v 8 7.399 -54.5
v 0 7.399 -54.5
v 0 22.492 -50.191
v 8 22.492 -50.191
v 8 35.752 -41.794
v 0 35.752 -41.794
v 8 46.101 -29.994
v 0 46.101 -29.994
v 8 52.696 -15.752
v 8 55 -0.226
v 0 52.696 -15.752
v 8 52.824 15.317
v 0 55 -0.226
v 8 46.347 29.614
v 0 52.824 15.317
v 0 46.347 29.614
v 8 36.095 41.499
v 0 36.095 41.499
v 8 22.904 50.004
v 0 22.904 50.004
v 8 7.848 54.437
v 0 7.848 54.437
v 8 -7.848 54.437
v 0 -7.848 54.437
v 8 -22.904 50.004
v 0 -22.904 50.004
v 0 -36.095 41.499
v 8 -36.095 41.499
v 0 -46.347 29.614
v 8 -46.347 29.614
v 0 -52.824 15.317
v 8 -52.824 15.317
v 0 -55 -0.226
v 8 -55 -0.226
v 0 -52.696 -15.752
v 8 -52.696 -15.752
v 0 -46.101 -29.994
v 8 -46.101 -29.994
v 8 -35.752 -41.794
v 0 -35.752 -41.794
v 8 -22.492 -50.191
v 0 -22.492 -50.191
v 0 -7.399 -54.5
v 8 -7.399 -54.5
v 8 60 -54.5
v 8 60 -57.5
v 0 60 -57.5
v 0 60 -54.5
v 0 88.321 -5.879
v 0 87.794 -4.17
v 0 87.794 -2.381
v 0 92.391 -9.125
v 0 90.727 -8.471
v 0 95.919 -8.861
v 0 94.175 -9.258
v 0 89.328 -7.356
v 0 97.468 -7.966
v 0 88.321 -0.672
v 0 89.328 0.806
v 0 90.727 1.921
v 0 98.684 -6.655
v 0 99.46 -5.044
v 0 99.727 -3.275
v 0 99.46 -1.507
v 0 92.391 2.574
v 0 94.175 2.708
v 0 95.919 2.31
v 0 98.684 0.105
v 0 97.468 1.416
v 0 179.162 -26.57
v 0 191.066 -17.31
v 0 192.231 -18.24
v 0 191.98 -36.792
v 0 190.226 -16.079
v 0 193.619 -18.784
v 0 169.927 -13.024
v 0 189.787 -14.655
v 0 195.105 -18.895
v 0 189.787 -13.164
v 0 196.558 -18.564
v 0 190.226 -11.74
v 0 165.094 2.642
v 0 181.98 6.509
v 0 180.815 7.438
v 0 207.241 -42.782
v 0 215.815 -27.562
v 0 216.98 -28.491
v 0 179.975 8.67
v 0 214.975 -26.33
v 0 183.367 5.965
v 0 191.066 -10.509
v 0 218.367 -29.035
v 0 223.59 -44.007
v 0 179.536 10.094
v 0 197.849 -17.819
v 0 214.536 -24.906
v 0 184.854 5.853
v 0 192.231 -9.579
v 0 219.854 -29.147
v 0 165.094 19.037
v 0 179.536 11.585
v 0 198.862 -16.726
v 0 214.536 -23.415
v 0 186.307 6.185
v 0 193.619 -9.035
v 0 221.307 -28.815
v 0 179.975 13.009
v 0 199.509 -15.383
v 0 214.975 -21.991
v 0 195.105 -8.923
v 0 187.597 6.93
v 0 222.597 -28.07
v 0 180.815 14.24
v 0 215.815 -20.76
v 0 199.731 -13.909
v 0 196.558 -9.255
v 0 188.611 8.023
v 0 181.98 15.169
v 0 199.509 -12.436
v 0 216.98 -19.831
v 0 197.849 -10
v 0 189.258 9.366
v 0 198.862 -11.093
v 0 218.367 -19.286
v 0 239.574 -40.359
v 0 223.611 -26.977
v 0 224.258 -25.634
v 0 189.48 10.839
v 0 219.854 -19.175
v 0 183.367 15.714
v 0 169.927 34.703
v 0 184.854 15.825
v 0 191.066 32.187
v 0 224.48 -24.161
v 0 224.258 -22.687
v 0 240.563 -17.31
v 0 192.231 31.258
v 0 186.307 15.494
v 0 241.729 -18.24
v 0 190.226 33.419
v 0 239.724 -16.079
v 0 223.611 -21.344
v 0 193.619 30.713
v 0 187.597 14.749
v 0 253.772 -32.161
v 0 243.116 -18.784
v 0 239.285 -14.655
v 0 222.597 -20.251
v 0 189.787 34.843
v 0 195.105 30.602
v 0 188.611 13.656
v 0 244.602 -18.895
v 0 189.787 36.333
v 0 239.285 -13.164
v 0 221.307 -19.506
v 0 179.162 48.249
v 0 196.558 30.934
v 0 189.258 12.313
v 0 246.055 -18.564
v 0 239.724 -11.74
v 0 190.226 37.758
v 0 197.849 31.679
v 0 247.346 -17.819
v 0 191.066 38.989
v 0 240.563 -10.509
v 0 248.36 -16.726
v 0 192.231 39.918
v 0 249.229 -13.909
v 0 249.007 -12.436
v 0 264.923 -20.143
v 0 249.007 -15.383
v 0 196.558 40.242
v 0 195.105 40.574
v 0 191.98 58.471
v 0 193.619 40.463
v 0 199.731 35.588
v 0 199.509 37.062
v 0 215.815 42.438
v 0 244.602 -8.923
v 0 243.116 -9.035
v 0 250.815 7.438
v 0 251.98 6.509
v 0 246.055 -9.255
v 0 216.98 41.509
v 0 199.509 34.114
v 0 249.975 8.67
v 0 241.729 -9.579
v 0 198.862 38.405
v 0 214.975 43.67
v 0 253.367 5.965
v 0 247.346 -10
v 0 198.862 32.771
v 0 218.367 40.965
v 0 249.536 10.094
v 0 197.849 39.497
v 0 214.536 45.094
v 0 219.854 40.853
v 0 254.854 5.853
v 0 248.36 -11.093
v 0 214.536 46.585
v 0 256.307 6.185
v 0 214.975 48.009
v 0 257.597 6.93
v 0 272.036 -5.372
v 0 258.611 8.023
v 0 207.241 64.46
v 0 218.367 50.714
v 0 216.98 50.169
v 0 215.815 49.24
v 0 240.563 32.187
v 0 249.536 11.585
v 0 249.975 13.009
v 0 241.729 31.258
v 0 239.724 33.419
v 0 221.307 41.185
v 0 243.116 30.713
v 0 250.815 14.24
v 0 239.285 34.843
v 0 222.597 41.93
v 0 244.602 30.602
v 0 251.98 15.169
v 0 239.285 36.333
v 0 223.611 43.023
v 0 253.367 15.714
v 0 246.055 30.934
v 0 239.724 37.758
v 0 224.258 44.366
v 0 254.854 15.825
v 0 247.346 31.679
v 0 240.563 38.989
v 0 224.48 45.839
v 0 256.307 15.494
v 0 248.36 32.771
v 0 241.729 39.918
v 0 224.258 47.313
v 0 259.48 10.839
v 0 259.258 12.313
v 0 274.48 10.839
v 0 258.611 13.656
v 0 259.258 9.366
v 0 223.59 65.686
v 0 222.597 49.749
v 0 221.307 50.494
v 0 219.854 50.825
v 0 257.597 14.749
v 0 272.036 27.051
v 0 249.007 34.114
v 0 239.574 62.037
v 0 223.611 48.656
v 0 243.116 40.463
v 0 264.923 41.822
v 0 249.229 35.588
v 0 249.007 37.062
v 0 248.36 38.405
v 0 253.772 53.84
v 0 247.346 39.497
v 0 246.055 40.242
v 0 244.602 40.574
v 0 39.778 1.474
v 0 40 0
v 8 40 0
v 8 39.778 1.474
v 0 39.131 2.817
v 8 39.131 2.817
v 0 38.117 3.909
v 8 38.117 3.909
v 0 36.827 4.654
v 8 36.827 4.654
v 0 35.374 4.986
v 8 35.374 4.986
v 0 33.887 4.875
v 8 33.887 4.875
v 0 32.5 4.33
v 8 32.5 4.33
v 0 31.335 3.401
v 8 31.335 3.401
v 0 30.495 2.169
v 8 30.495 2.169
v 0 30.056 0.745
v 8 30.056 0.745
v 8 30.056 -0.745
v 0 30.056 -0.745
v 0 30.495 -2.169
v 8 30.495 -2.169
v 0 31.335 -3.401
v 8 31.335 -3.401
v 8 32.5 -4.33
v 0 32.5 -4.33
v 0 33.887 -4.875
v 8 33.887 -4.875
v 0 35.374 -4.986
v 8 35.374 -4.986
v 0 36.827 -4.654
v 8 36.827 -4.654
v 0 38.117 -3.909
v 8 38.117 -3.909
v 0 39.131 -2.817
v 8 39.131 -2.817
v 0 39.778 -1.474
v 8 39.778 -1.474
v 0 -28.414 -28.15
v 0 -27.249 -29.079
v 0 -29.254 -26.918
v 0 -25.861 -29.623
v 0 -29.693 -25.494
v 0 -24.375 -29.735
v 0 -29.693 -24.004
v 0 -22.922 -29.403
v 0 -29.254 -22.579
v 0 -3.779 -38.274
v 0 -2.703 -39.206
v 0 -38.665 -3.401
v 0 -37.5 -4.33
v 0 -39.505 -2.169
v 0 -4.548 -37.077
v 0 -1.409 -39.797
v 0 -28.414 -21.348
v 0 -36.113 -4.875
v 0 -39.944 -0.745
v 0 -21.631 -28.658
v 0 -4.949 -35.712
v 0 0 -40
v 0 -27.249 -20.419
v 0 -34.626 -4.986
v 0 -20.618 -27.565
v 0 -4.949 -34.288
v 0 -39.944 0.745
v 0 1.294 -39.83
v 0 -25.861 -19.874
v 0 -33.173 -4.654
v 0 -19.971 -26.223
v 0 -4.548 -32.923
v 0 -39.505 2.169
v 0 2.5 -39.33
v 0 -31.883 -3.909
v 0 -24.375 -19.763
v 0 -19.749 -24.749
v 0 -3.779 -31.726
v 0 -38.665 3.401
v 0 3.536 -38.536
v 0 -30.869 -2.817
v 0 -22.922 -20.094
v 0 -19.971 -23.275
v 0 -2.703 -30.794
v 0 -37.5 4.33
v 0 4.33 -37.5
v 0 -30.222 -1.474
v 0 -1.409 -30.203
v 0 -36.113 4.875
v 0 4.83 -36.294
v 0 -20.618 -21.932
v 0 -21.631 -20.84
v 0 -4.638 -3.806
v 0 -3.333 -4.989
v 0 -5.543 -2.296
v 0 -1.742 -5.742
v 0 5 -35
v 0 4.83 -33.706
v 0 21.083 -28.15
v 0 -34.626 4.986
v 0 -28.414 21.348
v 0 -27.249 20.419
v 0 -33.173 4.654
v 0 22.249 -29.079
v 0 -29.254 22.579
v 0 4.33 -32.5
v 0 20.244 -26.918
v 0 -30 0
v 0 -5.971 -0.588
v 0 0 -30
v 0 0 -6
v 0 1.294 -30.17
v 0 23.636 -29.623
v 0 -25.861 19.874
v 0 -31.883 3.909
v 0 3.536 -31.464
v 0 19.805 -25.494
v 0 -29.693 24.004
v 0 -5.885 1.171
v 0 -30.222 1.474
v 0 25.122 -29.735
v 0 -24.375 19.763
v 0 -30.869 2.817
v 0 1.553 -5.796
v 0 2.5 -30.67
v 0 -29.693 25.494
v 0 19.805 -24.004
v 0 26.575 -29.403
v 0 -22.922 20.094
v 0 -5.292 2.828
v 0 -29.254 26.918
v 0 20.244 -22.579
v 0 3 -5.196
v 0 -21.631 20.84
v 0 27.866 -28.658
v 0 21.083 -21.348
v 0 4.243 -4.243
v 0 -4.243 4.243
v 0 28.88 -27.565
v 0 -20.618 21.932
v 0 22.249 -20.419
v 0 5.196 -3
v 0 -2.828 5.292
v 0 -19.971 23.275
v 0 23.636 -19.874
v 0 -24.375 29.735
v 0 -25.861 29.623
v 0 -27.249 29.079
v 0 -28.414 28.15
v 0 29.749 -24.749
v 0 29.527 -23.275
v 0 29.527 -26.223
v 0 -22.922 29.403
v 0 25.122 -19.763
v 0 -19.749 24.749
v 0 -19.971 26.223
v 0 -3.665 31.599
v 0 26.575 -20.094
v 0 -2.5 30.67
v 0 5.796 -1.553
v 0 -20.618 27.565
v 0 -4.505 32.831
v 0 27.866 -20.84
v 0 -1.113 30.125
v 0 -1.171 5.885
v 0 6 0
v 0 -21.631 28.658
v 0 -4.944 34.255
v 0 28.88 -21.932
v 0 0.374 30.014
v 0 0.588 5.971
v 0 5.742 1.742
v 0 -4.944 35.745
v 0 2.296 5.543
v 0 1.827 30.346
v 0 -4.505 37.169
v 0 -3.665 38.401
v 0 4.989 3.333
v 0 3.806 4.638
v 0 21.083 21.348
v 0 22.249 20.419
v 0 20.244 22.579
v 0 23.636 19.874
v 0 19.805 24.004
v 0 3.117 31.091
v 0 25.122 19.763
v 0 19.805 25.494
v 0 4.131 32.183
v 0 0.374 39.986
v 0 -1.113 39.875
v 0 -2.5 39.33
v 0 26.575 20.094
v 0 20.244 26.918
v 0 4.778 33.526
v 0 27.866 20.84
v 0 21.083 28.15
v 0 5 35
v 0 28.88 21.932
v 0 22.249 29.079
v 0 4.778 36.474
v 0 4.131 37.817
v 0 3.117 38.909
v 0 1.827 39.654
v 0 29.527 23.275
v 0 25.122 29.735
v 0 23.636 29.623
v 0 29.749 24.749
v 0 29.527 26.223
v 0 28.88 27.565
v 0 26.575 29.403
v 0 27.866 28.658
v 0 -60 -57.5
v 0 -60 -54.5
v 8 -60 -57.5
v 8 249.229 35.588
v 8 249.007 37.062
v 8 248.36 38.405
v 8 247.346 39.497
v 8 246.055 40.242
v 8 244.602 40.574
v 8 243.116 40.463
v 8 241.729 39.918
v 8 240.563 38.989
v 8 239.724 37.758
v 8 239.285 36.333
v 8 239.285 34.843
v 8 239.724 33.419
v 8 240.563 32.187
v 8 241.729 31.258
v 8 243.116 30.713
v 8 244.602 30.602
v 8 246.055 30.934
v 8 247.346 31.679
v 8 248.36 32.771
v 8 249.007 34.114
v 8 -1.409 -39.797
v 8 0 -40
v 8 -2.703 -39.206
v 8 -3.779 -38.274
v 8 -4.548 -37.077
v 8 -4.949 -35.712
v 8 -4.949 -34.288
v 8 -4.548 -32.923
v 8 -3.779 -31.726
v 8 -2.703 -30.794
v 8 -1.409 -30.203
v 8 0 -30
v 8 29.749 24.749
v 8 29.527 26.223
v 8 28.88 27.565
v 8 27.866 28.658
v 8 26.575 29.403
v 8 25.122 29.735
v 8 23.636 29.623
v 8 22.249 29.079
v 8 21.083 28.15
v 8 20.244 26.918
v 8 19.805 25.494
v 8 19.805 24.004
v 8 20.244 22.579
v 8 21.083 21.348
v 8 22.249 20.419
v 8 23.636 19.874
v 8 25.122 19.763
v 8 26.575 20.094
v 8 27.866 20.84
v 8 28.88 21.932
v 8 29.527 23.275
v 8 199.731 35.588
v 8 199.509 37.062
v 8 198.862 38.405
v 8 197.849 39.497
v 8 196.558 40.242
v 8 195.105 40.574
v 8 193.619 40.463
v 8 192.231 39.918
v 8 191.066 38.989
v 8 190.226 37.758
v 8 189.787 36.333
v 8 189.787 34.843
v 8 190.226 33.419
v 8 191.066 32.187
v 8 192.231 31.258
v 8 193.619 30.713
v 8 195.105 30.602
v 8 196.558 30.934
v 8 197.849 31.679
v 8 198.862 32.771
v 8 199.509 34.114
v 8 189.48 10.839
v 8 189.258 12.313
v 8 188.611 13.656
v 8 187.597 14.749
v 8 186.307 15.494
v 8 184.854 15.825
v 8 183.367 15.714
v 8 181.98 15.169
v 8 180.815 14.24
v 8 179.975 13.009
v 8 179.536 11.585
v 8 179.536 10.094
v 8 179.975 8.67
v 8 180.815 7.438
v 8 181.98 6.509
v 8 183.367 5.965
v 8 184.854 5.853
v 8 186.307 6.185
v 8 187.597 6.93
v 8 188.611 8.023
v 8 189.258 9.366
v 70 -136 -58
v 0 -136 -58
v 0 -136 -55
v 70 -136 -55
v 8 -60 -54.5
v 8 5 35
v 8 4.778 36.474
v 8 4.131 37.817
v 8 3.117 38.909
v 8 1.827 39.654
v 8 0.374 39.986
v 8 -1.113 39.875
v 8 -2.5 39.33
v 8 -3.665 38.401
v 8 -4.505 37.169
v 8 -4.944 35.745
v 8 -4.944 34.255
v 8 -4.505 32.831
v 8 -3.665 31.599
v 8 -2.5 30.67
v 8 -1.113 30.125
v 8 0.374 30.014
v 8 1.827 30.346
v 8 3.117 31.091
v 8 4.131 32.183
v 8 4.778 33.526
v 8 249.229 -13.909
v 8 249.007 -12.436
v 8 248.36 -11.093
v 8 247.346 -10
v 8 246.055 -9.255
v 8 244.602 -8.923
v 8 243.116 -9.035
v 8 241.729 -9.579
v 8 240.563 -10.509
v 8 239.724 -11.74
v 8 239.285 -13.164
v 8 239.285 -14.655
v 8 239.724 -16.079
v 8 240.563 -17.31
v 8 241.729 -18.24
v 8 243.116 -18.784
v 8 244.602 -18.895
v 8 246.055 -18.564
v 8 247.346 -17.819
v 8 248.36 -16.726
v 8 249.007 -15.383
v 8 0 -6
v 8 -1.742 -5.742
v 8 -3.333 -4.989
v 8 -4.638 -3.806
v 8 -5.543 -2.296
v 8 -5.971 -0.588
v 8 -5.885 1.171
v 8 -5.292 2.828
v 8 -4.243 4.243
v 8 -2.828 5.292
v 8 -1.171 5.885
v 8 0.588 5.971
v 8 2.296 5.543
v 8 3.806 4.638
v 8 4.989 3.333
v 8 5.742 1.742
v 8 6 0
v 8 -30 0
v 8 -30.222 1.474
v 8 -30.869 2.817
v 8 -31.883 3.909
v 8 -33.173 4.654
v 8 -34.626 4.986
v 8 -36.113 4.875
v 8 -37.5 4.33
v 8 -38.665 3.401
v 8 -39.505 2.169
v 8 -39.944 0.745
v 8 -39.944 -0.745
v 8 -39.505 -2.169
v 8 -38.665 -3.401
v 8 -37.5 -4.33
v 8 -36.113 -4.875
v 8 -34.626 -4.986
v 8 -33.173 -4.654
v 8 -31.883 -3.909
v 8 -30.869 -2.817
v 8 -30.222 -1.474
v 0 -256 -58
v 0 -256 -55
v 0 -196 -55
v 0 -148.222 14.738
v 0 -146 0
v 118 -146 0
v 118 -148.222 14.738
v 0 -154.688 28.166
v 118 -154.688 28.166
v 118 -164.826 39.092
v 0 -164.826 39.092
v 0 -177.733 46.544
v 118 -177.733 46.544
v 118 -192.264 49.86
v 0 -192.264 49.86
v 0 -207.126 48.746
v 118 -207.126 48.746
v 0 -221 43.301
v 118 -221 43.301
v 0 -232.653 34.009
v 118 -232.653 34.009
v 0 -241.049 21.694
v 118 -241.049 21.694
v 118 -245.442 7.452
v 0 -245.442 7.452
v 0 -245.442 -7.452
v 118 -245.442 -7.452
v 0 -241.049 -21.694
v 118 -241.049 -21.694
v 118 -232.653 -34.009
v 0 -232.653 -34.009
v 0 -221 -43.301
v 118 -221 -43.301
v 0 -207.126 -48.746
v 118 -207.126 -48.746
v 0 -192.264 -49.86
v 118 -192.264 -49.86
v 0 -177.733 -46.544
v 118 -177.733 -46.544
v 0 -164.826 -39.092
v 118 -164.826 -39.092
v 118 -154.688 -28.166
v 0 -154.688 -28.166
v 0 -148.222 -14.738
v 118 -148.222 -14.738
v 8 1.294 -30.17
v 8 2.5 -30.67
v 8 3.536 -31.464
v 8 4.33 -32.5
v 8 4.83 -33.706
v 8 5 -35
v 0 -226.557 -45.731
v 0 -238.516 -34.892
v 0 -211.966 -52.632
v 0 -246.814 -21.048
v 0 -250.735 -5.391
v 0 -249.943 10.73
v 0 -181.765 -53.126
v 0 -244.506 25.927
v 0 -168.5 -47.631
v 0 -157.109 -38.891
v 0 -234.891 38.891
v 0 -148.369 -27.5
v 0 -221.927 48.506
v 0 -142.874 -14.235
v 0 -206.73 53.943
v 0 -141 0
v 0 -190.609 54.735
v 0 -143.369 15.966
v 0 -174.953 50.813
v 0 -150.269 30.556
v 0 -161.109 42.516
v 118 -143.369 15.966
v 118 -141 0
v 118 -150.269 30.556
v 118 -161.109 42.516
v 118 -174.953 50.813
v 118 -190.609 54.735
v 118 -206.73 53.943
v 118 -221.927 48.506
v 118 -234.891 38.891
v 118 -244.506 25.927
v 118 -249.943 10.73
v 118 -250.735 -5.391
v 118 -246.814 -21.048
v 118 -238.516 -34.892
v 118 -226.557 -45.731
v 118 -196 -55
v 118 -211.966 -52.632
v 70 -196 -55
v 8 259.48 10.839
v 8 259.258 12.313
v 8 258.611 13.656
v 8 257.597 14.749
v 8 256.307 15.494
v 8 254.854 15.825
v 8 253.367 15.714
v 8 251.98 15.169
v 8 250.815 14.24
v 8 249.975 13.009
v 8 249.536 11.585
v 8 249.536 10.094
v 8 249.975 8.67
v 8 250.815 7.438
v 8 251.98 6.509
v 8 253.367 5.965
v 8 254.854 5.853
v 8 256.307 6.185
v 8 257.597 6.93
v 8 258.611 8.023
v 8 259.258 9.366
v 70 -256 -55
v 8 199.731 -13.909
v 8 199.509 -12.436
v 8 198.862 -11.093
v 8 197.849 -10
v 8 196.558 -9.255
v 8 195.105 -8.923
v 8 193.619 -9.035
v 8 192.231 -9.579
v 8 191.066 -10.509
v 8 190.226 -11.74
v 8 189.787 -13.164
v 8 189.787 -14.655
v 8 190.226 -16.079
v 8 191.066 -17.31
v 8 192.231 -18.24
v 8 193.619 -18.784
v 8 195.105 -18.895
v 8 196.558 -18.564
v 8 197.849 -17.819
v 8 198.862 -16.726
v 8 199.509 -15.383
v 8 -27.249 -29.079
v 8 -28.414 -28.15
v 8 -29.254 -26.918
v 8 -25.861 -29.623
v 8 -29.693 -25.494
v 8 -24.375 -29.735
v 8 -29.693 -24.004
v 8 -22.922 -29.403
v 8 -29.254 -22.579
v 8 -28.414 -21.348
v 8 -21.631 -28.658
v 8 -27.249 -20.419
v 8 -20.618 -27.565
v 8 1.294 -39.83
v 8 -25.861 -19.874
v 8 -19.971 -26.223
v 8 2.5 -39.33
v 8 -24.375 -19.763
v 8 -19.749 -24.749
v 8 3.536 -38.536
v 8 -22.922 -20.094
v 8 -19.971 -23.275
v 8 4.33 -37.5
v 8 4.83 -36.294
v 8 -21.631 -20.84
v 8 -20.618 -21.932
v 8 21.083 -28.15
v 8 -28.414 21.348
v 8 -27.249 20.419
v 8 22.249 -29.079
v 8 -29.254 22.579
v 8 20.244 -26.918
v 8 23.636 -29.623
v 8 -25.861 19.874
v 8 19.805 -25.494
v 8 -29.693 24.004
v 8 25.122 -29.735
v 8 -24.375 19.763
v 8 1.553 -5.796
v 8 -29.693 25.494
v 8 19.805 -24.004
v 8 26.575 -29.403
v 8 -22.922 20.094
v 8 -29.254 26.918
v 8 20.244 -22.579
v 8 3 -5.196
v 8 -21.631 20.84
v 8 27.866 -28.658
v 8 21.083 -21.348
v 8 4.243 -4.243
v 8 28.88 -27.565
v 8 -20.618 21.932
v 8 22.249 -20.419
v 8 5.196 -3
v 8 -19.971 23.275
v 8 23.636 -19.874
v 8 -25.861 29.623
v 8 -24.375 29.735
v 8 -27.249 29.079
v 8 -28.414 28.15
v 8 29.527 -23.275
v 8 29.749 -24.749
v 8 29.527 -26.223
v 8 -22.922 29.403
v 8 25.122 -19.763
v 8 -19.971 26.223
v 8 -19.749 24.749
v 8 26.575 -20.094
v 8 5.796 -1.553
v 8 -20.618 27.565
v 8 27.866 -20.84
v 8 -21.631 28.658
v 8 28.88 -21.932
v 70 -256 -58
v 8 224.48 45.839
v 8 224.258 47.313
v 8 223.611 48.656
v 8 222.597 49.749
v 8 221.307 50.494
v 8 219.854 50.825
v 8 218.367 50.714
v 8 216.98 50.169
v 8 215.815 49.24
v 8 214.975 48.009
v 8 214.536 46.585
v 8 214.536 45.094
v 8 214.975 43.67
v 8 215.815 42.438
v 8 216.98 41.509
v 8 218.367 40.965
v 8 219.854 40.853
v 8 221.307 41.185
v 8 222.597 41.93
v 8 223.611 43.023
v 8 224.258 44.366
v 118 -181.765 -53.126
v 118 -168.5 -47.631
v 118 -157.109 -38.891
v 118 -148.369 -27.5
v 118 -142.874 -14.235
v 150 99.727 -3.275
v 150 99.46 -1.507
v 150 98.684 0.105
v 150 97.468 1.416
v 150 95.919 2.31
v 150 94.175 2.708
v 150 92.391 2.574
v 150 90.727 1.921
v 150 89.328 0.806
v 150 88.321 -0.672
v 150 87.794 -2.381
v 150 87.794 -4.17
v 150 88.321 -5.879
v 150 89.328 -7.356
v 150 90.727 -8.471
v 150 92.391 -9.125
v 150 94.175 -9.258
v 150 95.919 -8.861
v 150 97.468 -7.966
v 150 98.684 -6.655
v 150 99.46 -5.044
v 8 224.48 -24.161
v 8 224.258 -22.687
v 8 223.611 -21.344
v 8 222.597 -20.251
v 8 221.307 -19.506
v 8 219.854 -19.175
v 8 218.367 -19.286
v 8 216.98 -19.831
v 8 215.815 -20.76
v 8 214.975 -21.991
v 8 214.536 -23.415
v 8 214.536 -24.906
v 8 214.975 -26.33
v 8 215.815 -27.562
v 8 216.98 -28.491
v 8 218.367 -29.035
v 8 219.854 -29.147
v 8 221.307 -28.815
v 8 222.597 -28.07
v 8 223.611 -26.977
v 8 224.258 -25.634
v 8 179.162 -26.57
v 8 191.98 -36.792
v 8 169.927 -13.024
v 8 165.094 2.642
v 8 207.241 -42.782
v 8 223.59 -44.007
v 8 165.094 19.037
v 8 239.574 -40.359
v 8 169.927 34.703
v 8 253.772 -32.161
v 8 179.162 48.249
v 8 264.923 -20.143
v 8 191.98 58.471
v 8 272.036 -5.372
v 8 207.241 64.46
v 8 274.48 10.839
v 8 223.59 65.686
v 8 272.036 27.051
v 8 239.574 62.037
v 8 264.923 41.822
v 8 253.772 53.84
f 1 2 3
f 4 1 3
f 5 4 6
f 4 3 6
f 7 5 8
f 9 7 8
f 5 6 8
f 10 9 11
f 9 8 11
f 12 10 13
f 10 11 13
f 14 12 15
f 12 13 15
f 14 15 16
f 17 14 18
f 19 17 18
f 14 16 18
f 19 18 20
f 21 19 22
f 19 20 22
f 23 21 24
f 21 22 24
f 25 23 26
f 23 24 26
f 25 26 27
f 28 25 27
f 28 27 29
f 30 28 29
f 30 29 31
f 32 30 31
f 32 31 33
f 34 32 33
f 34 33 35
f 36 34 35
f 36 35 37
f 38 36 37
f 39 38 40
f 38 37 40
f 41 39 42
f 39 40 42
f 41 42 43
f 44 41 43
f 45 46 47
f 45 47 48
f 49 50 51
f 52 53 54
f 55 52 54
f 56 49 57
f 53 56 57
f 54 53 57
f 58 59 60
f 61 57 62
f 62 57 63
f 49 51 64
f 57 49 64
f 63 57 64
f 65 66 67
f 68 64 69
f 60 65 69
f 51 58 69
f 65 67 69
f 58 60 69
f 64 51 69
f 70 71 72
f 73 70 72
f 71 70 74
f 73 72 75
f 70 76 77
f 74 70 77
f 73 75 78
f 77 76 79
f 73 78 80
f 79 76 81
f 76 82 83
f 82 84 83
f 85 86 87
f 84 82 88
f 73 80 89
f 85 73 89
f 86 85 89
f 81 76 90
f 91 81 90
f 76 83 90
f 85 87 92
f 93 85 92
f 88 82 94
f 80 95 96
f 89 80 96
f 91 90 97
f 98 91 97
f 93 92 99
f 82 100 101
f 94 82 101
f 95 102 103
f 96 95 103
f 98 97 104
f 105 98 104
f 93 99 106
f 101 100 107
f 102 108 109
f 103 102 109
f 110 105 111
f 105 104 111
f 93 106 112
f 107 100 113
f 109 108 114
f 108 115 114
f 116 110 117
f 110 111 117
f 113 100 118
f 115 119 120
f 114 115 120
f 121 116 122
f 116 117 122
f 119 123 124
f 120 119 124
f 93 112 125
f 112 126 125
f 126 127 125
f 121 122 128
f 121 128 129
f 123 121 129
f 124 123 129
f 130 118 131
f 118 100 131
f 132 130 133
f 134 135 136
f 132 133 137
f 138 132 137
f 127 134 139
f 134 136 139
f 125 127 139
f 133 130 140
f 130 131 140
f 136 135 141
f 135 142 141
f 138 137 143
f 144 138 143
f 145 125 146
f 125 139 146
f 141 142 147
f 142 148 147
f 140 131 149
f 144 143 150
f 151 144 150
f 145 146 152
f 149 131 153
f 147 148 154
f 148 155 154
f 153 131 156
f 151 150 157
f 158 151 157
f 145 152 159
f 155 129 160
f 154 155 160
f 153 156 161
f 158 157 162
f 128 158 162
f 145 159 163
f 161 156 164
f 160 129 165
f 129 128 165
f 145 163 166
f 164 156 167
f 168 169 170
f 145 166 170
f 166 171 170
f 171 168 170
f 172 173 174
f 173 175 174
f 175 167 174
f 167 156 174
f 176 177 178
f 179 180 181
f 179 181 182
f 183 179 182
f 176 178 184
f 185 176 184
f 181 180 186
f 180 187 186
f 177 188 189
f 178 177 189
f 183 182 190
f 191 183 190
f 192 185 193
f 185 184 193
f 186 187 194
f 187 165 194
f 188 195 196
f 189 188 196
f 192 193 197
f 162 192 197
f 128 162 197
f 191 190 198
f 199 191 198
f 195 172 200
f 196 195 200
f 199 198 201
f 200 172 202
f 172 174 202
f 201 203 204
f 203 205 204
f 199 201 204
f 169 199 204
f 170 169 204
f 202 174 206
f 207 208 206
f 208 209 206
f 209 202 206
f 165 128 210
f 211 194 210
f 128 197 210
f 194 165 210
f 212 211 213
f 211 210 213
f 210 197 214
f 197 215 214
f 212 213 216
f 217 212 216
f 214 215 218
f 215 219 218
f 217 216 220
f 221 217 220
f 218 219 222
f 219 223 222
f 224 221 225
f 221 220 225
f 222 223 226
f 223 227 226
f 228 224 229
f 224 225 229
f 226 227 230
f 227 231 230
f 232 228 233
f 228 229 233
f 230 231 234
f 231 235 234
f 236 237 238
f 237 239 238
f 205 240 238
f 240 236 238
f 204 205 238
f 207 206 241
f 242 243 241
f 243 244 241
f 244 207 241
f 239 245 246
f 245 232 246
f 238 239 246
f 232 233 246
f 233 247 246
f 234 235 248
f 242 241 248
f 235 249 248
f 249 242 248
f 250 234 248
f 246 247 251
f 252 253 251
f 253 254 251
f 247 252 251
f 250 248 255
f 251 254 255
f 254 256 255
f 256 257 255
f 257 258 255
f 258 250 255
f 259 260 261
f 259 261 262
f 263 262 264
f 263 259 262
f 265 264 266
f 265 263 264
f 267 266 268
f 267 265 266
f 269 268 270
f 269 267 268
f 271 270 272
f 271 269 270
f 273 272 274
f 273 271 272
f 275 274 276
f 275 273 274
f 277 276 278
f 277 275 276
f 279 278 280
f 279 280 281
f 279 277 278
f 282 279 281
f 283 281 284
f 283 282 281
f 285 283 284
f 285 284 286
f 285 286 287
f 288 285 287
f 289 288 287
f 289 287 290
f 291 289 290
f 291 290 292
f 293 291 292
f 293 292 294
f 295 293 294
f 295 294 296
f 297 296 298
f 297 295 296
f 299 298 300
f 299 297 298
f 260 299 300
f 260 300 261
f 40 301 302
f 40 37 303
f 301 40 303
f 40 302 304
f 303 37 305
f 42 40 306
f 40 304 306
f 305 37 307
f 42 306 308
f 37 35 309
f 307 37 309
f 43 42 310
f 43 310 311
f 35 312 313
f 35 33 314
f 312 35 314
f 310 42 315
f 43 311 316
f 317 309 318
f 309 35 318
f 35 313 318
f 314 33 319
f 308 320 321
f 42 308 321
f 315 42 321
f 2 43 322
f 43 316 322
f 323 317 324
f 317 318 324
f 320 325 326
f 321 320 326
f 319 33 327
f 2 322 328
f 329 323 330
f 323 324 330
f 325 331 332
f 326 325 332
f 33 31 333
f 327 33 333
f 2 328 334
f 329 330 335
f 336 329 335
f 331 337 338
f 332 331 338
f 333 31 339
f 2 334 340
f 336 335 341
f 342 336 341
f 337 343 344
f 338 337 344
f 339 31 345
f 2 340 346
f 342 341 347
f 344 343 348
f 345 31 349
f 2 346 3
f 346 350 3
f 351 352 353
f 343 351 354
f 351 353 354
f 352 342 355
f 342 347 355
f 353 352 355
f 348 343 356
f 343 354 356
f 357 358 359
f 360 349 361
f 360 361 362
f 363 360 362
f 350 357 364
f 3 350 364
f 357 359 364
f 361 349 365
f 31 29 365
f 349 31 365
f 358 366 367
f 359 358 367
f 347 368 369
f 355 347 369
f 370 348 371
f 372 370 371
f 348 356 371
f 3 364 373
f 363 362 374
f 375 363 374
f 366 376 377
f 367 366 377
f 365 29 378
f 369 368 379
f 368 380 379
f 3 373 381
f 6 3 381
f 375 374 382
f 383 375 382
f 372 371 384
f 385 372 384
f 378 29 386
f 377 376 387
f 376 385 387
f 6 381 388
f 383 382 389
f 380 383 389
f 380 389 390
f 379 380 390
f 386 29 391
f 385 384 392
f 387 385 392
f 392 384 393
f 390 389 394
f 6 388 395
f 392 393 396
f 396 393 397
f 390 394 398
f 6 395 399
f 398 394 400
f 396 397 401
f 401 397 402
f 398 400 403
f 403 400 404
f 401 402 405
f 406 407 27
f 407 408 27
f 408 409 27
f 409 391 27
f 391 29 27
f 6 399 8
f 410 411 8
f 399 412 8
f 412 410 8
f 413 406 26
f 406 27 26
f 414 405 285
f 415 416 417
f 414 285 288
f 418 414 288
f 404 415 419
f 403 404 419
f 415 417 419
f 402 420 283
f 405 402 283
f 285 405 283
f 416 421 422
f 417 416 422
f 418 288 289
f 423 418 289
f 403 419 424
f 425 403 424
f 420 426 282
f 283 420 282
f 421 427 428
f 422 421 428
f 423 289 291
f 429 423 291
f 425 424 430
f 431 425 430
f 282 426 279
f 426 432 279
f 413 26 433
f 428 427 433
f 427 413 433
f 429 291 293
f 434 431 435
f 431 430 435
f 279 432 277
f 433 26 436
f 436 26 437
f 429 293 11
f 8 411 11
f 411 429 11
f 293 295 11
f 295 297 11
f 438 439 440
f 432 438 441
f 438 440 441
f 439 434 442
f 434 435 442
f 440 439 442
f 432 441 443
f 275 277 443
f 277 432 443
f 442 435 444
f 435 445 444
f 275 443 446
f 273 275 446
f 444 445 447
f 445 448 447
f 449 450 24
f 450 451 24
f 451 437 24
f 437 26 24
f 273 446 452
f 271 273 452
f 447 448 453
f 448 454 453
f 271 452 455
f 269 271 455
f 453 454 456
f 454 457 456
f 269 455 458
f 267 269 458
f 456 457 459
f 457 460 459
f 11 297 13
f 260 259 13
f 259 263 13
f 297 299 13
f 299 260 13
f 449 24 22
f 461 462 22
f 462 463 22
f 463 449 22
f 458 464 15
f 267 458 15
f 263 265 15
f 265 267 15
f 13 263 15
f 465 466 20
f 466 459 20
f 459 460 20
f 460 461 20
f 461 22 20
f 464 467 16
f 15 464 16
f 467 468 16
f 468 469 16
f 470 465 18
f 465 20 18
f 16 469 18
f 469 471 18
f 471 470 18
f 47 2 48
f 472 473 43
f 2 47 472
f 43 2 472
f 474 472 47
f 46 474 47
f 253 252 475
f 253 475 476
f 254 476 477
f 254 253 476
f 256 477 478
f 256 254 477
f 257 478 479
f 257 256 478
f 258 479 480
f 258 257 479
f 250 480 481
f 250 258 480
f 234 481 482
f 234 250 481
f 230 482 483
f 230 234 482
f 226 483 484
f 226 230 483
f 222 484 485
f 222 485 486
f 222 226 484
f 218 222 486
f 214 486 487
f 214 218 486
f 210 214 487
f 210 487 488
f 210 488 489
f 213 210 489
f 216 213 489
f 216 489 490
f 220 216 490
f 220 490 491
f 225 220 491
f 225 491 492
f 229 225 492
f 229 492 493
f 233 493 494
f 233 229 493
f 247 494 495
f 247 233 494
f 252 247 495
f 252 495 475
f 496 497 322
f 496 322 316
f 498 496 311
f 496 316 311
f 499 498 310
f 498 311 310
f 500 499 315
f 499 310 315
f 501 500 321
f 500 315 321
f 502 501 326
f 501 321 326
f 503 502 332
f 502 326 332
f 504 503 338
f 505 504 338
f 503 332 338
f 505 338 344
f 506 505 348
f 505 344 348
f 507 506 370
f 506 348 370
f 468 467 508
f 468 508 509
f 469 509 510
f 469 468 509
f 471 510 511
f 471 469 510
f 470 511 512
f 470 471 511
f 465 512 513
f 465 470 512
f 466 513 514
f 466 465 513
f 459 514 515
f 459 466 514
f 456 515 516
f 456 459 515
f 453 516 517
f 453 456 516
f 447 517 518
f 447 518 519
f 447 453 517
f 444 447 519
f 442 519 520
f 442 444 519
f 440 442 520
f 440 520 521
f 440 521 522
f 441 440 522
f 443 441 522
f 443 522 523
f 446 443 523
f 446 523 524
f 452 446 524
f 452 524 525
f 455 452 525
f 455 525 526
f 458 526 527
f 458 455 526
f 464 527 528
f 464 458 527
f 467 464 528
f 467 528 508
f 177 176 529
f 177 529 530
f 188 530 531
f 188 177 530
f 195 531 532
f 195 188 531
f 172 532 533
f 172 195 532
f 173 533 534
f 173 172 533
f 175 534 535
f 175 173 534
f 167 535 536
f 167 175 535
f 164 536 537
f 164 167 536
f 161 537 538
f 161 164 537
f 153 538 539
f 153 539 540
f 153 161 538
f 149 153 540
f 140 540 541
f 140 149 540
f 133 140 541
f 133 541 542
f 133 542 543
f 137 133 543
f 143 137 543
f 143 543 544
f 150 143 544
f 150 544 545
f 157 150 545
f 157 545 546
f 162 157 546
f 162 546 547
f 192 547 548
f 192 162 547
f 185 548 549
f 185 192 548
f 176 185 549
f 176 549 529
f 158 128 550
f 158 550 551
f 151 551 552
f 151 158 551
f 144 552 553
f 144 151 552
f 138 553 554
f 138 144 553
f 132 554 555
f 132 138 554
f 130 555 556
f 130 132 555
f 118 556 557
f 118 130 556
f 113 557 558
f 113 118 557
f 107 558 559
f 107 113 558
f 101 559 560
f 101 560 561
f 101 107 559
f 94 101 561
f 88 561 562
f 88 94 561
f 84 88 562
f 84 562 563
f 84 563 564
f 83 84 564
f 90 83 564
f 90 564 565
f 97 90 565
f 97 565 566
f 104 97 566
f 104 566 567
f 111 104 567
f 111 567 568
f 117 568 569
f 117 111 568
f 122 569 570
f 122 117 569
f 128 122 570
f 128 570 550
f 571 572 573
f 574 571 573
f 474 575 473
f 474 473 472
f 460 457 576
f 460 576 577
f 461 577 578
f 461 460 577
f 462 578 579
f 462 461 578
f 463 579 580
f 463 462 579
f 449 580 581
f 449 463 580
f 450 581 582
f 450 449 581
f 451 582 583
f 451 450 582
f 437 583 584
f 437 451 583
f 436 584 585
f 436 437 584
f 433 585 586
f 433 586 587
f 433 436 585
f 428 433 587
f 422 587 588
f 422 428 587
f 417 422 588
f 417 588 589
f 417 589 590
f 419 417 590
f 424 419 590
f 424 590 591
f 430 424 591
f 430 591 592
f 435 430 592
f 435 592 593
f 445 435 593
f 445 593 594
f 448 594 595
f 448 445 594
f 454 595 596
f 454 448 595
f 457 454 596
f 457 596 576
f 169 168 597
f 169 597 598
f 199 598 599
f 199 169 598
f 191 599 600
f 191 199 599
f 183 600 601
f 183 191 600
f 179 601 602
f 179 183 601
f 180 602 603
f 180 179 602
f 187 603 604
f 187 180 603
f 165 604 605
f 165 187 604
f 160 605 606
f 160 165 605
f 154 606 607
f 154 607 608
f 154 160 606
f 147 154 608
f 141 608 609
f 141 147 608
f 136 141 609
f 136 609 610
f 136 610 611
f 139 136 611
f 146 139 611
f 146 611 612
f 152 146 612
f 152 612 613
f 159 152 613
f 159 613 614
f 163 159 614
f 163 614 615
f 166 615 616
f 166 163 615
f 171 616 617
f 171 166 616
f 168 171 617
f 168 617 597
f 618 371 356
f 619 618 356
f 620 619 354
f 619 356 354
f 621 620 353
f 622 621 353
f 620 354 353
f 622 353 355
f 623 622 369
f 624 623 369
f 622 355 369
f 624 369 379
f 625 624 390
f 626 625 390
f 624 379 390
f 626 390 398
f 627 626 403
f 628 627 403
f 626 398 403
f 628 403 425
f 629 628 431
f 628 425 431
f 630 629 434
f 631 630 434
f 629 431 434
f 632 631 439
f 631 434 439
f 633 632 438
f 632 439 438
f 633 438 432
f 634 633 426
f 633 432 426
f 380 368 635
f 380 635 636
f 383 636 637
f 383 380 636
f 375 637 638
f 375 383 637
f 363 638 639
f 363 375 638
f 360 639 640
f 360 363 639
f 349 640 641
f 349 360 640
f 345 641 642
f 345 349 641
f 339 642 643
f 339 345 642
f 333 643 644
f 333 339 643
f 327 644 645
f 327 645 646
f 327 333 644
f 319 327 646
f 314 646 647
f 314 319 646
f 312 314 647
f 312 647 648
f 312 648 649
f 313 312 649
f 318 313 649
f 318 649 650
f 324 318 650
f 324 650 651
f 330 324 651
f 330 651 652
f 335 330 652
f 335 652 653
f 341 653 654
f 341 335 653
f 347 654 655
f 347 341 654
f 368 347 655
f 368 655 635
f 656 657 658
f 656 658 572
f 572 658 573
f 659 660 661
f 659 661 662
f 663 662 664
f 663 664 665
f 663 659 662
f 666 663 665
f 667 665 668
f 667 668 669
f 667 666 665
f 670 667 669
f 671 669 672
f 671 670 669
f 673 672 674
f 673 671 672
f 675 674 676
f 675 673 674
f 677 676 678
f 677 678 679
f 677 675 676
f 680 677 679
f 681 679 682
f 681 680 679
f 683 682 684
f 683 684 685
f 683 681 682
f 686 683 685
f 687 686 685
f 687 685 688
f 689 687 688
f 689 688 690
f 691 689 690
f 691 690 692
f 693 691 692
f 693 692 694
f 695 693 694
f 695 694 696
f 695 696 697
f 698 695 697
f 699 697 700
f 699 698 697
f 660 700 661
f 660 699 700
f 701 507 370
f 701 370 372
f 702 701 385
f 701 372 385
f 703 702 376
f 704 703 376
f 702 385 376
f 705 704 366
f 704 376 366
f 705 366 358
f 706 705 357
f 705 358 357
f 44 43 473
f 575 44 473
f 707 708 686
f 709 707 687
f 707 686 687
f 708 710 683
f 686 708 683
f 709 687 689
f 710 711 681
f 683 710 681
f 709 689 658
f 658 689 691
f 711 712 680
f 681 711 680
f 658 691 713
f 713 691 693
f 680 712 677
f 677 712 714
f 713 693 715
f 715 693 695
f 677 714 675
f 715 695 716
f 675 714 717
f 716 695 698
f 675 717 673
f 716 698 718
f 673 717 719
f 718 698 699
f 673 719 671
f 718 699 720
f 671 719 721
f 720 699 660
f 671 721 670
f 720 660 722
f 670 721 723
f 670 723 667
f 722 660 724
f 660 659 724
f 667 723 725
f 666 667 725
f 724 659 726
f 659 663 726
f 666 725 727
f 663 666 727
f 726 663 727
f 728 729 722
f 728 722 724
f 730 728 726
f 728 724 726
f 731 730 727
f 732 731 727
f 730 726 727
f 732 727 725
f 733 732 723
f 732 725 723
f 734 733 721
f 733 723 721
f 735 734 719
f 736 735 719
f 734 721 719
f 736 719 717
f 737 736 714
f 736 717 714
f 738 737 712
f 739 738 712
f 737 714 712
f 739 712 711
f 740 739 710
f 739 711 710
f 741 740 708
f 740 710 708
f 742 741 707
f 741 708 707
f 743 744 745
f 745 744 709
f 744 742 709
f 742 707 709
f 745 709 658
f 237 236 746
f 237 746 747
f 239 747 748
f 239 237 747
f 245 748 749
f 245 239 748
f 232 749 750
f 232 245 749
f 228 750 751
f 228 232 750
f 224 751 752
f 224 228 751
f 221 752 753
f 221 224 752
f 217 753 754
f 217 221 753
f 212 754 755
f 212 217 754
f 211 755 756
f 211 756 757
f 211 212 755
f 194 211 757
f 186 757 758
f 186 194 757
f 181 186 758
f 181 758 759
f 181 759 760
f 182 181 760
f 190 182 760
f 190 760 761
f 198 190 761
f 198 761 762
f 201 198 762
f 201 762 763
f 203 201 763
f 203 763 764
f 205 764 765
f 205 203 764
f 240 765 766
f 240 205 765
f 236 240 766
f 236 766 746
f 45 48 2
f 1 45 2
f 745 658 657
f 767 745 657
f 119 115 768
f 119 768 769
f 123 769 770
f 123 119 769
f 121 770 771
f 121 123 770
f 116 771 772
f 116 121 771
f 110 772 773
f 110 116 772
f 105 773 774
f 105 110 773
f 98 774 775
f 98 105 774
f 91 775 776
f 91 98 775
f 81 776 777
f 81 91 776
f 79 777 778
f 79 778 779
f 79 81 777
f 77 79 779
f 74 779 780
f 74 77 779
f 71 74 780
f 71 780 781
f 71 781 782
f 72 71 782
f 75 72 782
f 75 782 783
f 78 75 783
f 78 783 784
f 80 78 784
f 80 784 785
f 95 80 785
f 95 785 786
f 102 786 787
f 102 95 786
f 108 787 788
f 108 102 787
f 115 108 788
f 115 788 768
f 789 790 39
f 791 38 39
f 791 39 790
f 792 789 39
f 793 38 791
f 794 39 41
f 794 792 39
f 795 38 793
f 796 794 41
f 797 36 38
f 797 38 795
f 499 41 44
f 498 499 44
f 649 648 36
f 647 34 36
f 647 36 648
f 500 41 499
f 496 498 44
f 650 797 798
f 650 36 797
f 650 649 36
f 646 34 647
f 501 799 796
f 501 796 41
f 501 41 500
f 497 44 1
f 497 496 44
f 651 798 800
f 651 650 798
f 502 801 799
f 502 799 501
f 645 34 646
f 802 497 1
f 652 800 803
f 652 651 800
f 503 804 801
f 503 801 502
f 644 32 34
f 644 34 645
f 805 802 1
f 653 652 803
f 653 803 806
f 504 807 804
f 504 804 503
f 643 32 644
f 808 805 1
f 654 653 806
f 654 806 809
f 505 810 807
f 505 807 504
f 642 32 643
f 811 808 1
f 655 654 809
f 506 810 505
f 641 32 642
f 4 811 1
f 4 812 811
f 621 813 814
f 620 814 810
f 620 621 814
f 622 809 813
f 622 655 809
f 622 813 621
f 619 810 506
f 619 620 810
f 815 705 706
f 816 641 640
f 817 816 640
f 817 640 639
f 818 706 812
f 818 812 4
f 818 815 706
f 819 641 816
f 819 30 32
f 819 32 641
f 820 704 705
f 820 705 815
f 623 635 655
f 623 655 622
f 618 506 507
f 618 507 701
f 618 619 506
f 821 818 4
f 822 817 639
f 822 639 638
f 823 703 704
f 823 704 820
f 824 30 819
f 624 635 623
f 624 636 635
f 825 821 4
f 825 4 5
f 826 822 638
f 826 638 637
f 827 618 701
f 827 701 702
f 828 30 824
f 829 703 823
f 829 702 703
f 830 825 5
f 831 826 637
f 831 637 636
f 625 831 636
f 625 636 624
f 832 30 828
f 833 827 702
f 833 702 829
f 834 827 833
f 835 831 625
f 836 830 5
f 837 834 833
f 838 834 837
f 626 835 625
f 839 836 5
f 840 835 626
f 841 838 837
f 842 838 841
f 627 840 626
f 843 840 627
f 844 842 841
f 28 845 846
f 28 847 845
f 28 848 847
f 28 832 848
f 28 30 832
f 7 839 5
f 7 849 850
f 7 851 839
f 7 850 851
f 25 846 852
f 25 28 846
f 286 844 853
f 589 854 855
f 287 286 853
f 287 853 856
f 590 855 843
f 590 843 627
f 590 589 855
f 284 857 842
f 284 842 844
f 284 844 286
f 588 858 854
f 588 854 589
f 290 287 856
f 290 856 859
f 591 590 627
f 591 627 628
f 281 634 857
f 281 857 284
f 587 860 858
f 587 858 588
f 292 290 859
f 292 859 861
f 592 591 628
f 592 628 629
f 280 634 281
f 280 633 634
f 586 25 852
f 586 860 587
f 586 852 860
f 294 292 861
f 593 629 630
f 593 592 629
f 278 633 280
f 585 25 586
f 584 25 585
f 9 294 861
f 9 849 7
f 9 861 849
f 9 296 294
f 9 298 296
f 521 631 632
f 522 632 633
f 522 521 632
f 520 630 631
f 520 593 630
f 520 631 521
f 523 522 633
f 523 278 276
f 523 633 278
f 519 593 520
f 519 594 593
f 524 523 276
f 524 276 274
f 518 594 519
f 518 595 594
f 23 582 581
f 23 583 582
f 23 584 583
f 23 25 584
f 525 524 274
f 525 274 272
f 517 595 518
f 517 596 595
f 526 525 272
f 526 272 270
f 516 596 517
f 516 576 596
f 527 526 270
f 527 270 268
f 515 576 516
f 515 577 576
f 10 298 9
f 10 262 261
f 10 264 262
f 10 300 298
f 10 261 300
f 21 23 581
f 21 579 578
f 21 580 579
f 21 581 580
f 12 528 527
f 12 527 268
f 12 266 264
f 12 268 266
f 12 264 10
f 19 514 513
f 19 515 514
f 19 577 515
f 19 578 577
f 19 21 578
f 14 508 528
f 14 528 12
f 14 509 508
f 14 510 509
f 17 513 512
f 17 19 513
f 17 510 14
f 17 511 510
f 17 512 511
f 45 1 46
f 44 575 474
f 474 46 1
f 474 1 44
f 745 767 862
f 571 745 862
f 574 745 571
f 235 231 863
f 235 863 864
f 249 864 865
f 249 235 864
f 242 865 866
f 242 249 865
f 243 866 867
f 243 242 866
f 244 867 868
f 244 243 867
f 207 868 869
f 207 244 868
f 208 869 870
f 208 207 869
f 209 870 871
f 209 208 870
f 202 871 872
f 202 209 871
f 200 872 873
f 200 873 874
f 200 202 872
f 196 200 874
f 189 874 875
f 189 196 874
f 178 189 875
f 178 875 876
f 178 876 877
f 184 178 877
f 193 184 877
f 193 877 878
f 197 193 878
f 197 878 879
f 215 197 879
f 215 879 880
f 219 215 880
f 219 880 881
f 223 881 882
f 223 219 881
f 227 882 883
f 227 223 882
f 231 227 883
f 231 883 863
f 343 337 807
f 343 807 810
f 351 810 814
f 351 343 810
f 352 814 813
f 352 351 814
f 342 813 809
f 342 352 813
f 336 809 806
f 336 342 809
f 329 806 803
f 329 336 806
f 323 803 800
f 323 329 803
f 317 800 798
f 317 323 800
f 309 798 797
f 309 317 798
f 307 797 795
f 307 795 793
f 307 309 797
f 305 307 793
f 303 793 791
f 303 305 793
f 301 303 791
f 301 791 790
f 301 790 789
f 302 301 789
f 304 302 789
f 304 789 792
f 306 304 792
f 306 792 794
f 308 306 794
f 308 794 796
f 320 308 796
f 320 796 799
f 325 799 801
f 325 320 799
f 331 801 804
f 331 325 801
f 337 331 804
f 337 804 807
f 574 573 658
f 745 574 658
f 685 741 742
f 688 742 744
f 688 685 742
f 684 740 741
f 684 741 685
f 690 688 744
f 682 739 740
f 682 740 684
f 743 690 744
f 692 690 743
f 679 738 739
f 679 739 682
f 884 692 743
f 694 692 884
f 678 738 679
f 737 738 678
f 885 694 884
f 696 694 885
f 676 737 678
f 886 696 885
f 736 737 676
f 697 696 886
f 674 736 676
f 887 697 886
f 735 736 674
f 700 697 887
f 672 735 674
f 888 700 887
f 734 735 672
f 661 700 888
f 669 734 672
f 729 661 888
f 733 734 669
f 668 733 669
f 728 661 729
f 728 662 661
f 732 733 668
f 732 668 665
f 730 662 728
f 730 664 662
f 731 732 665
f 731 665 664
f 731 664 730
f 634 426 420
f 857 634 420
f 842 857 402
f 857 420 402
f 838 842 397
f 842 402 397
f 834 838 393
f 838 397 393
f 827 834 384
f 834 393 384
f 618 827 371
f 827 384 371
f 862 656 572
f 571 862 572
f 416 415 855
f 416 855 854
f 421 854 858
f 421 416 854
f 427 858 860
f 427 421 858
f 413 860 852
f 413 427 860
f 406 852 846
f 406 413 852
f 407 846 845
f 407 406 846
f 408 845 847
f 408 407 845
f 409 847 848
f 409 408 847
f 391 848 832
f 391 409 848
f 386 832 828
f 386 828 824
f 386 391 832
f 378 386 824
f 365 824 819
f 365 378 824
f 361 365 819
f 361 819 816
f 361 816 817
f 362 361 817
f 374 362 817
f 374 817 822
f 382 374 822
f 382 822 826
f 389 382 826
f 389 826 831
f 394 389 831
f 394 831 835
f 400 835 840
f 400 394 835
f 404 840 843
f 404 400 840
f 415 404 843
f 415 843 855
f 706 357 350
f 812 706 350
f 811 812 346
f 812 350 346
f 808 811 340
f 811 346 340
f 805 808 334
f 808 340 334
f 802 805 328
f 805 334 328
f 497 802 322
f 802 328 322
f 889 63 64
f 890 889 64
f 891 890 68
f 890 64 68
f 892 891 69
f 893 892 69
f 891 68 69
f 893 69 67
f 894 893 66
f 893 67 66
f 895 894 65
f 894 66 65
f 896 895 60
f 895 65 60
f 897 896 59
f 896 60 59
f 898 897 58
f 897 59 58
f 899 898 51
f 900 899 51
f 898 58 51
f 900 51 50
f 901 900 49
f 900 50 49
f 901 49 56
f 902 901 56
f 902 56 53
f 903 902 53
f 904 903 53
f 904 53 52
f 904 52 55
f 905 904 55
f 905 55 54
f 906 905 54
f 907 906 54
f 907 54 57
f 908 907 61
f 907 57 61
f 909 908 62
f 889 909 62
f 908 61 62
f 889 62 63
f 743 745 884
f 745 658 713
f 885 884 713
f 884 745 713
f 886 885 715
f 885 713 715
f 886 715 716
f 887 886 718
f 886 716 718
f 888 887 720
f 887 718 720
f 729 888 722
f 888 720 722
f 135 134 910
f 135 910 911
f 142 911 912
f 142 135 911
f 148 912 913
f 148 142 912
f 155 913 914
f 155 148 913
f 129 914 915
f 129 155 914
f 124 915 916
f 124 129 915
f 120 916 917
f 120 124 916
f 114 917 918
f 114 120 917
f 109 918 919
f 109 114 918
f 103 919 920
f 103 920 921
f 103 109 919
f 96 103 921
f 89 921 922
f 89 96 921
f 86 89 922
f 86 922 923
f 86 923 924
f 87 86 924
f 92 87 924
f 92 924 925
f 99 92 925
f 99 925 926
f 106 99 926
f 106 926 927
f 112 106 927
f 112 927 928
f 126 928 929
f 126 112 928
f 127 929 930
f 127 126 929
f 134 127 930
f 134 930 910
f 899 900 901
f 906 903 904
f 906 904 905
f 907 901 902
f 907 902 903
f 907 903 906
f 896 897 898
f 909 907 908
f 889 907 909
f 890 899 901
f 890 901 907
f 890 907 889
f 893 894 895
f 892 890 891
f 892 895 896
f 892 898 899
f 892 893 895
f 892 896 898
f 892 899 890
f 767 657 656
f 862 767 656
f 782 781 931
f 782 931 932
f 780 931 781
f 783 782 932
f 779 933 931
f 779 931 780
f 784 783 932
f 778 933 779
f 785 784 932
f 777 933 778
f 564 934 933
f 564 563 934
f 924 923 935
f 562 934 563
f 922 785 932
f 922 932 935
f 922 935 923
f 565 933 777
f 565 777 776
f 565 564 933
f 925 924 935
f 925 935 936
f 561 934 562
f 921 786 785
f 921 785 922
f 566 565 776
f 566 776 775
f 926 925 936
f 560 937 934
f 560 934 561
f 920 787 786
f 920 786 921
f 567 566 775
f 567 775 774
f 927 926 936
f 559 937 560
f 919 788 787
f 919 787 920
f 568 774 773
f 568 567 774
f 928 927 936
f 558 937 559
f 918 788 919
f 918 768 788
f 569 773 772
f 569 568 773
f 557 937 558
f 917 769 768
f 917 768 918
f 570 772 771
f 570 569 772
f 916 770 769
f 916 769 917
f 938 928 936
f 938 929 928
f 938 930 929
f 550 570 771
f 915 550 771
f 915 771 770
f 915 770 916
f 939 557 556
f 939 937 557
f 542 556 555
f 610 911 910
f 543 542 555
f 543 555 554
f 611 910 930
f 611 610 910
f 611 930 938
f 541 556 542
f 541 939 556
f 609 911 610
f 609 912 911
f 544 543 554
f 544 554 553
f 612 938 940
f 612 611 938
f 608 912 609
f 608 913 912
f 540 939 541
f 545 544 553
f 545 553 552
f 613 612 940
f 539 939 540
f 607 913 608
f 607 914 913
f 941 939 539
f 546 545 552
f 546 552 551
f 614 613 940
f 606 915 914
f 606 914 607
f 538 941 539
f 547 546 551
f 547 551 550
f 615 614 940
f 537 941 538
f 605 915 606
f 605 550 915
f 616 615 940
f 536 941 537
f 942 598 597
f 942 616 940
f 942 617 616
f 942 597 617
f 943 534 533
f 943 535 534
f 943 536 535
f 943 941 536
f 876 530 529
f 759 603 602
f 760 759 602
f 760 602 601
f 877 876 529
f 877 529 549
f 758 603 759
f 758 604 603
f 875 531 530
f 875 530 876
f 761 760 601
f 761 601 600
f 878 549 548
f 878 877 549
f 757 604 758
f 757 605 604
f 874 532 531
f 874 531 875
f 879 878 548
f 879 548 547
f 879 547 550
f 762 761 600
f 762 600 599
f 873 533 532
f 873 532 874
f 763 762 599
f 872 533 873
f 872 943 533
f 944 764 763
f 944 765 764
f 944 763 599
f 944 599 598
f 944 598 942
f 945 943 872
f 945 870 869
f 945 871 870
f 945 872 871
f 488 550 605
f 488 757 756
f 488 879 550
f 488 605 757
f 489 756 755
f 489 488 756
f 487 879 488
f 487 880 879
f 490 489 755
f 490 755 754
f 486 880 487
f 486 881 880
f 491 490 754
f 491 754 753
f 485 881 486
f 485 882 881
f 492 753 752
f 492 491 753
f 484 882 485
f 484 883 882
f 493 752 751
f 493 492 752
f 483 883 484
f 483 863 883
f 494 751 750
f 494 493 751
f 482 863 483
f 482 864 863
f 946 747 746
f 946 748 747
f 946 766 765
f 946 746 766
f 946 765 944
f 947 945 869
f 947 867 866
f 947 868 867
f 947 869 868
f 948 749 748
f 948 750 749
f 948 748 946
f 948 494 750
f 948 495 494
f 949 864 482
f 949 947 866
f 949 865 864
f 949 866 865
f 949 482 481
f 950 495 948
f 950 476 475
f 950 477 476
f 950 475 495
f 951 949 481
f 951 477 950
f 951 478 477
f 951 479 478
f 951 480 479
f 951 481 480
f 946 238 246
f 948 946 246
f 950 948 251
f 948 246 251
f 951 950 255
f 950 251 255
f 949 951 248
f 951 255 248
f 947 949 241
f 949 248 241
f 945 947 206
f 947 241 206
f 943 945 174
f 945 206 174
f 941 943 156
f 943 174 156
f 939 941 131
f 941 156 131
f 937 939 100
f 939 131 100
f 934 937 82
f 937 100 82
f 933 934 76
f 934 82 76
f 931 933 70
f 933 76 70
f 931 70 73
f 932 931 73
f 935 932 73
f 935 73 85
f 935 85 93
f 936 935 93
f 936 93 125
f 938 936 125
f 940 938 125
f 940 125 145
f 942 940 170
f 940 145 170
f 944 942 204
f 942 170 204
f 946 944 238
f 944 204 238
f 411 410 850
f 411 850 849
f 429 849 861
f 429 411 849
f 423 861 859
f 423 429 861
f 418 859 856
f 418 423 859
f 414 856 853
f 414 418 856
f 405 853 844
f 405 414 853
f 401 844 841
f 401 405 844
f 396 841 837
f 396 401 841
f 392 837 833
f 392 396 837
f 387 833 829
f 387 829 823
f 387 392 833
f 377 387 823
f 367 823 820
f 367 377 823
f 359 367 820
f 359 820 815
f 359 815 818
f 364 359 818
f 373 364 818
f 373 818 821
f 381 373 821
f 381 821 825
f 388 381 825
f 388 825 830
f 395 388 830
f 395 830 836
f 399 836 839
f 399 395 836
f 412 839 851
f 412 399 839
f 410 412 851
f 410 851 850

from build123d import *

# Parameters (mm, degrees)
F0_R     = 5
F1_DEPTH = 8
F2_R     = 6
F3_DEPTH = 150
F4_R     = 55
F4_R_2   = 5
F5_DEPTH = 8
F6_R     = 50
F7_DEPTH = 118
F8_DEPTH = 70


with BuildPart() as f1:
    # F0 (on Right) → F1 (new body)
    with BuildSketch(Plane.YZ):
        with BuildLine():
            Line((60, -54.5), (7.399324, -54.5))
            ThreePointArc((7.399324, -54.5), (0, 55), (-7.399324, -54.5))
            Line((-7.399324, -54.5), (-60, -54.5))
            Line((-60, -54.5), (-60, -57.5))
            Line((-60, -57.5), (60, -57.5))
            Line((60, -57.5), (60, -55))
            Line((60, -55), (60, -54.5))
        make_face()
        with Locations((-24.748737, -24.748737)):
            Circle(F0_R, mode=Mode.SUBTRACT)
        with BuildLine():
            ThreePointArc((0, -40), (-5, -35), (0, -30))
            ThreePointArc((0, -30), (3.535534, -31.464466), (5, -35))
            ThreePointArc((5, -35), (3.535534, -38.535534), (0, -40))
        make_face(mode=Mode.SUBTRACT)
        with Locations((24.748737, -24.748737)):
            Circle(F0_R, mode=Mode.SUBTRACT)
        with Locations((-35, 0)):
            Circle(F0_R, mode=Mode.SUBTRACT)
        with Locations((-24.748737, 24.748737)):
            Circle(F0_R, mode=Mode.SUBTRACT)
        with BuildLine():
            ThreePointArc((0, -6), (-4.242641, 4.242641), (6, 0))
            ThreePointArc((6, 0), (4.242641, -4.242641), (0, -6))
        make_face(mode=Mode.SUBTRACT)
        with Locations((24.748737, 24.748737)):
            Circle(F0_R, mode=Mode.SUBTRACT)
        with Locations((35, 0)):
            Circle(F0_R, mode=Mode.SUBTRACT)
        with Locations((0, 35)):
            Circle(F0_R, mode=Mode.SUBTRACT)
    extrude(amount=F1_DEPTH)


with BuildPart() as f3:
    # F2 (on Right) → F3 (new body)
    with BuildSketch(Plane.YZ):
        with Locations((93.726583, -3.275273)):
            Circle(F2_R)
    extrude(amount=F3_DEPTH)


with BuildPart() as f5:
    # F4 (on Right) → F5 (new body)
    with BuildSketch(Plane.YZ):
        with Locations((219.479918, 10.839347)):
            Circle(F4_R)
        with Locations((194.731181, -13.909391)):
            Circle(F4_R_2, mode=Mode.SUBTRACT)
        with Locations((219.479918, -24.160653)):
            Circle(F4_R_2, mode=Mode.SUBTRACT)
        with Locations((244.228656, -13.909391)):
            Circle(F4_R_2, mode=Mode.SUBTRACT)
        with Locations((254.479918, 10.839347)):
            Circle(F4_R_2, mode=Mode.SUBTRACT)
        with Locations((184.479918, 10.839347)):
            Circle(F4_R_2, mode=Mode.SUBTRACT)
        with Locations((194.731181, 35.588084)):
            Circle(F4_R_2, mode=Mode.SUBTRACT)
        with Locations((244.228656, 35.588084)):
            Circle(F4_R_2, mode=Mode.SUBTRACT)
        with Locations((219.479918, 45.839347)):
            Circle(F4_R_2, mode=Mode.SUBTRACT)
    extrude(amount=F5_DEPTH)


with BuildPart() as f7:
    # F6 (on Right) → F7 (new body)
    with BuildSketch(Plane.YZ):
        with BuildLine():
            ThreePointArc((-196.000233, -55), (-157.10936, -38.890873), (-141.000233, 0))
            ThreePointArc((-141.000233, 0), (-234.891106, 38.890873), (-196.000233, -55))
        make_face()
        with Locations((-196.000233, 0)):
            Circle(F6_R, mode=Mode.SUBTRACT)
    extrude(amount=F7_DEPTH)

    # F6 (on Right) → F8 (join)
    with BuildSketch(Plane.YZ):
        Polygon((-136.000233, -55), (-196.000233, -55), (-256.000233, -55), (-256.000233, -58), (-136.000233, -58), align=None)
    extrude(amount=F8_DEPTH)


solid = Compound([f1.part, f3.part, f5.part, f7.part])
